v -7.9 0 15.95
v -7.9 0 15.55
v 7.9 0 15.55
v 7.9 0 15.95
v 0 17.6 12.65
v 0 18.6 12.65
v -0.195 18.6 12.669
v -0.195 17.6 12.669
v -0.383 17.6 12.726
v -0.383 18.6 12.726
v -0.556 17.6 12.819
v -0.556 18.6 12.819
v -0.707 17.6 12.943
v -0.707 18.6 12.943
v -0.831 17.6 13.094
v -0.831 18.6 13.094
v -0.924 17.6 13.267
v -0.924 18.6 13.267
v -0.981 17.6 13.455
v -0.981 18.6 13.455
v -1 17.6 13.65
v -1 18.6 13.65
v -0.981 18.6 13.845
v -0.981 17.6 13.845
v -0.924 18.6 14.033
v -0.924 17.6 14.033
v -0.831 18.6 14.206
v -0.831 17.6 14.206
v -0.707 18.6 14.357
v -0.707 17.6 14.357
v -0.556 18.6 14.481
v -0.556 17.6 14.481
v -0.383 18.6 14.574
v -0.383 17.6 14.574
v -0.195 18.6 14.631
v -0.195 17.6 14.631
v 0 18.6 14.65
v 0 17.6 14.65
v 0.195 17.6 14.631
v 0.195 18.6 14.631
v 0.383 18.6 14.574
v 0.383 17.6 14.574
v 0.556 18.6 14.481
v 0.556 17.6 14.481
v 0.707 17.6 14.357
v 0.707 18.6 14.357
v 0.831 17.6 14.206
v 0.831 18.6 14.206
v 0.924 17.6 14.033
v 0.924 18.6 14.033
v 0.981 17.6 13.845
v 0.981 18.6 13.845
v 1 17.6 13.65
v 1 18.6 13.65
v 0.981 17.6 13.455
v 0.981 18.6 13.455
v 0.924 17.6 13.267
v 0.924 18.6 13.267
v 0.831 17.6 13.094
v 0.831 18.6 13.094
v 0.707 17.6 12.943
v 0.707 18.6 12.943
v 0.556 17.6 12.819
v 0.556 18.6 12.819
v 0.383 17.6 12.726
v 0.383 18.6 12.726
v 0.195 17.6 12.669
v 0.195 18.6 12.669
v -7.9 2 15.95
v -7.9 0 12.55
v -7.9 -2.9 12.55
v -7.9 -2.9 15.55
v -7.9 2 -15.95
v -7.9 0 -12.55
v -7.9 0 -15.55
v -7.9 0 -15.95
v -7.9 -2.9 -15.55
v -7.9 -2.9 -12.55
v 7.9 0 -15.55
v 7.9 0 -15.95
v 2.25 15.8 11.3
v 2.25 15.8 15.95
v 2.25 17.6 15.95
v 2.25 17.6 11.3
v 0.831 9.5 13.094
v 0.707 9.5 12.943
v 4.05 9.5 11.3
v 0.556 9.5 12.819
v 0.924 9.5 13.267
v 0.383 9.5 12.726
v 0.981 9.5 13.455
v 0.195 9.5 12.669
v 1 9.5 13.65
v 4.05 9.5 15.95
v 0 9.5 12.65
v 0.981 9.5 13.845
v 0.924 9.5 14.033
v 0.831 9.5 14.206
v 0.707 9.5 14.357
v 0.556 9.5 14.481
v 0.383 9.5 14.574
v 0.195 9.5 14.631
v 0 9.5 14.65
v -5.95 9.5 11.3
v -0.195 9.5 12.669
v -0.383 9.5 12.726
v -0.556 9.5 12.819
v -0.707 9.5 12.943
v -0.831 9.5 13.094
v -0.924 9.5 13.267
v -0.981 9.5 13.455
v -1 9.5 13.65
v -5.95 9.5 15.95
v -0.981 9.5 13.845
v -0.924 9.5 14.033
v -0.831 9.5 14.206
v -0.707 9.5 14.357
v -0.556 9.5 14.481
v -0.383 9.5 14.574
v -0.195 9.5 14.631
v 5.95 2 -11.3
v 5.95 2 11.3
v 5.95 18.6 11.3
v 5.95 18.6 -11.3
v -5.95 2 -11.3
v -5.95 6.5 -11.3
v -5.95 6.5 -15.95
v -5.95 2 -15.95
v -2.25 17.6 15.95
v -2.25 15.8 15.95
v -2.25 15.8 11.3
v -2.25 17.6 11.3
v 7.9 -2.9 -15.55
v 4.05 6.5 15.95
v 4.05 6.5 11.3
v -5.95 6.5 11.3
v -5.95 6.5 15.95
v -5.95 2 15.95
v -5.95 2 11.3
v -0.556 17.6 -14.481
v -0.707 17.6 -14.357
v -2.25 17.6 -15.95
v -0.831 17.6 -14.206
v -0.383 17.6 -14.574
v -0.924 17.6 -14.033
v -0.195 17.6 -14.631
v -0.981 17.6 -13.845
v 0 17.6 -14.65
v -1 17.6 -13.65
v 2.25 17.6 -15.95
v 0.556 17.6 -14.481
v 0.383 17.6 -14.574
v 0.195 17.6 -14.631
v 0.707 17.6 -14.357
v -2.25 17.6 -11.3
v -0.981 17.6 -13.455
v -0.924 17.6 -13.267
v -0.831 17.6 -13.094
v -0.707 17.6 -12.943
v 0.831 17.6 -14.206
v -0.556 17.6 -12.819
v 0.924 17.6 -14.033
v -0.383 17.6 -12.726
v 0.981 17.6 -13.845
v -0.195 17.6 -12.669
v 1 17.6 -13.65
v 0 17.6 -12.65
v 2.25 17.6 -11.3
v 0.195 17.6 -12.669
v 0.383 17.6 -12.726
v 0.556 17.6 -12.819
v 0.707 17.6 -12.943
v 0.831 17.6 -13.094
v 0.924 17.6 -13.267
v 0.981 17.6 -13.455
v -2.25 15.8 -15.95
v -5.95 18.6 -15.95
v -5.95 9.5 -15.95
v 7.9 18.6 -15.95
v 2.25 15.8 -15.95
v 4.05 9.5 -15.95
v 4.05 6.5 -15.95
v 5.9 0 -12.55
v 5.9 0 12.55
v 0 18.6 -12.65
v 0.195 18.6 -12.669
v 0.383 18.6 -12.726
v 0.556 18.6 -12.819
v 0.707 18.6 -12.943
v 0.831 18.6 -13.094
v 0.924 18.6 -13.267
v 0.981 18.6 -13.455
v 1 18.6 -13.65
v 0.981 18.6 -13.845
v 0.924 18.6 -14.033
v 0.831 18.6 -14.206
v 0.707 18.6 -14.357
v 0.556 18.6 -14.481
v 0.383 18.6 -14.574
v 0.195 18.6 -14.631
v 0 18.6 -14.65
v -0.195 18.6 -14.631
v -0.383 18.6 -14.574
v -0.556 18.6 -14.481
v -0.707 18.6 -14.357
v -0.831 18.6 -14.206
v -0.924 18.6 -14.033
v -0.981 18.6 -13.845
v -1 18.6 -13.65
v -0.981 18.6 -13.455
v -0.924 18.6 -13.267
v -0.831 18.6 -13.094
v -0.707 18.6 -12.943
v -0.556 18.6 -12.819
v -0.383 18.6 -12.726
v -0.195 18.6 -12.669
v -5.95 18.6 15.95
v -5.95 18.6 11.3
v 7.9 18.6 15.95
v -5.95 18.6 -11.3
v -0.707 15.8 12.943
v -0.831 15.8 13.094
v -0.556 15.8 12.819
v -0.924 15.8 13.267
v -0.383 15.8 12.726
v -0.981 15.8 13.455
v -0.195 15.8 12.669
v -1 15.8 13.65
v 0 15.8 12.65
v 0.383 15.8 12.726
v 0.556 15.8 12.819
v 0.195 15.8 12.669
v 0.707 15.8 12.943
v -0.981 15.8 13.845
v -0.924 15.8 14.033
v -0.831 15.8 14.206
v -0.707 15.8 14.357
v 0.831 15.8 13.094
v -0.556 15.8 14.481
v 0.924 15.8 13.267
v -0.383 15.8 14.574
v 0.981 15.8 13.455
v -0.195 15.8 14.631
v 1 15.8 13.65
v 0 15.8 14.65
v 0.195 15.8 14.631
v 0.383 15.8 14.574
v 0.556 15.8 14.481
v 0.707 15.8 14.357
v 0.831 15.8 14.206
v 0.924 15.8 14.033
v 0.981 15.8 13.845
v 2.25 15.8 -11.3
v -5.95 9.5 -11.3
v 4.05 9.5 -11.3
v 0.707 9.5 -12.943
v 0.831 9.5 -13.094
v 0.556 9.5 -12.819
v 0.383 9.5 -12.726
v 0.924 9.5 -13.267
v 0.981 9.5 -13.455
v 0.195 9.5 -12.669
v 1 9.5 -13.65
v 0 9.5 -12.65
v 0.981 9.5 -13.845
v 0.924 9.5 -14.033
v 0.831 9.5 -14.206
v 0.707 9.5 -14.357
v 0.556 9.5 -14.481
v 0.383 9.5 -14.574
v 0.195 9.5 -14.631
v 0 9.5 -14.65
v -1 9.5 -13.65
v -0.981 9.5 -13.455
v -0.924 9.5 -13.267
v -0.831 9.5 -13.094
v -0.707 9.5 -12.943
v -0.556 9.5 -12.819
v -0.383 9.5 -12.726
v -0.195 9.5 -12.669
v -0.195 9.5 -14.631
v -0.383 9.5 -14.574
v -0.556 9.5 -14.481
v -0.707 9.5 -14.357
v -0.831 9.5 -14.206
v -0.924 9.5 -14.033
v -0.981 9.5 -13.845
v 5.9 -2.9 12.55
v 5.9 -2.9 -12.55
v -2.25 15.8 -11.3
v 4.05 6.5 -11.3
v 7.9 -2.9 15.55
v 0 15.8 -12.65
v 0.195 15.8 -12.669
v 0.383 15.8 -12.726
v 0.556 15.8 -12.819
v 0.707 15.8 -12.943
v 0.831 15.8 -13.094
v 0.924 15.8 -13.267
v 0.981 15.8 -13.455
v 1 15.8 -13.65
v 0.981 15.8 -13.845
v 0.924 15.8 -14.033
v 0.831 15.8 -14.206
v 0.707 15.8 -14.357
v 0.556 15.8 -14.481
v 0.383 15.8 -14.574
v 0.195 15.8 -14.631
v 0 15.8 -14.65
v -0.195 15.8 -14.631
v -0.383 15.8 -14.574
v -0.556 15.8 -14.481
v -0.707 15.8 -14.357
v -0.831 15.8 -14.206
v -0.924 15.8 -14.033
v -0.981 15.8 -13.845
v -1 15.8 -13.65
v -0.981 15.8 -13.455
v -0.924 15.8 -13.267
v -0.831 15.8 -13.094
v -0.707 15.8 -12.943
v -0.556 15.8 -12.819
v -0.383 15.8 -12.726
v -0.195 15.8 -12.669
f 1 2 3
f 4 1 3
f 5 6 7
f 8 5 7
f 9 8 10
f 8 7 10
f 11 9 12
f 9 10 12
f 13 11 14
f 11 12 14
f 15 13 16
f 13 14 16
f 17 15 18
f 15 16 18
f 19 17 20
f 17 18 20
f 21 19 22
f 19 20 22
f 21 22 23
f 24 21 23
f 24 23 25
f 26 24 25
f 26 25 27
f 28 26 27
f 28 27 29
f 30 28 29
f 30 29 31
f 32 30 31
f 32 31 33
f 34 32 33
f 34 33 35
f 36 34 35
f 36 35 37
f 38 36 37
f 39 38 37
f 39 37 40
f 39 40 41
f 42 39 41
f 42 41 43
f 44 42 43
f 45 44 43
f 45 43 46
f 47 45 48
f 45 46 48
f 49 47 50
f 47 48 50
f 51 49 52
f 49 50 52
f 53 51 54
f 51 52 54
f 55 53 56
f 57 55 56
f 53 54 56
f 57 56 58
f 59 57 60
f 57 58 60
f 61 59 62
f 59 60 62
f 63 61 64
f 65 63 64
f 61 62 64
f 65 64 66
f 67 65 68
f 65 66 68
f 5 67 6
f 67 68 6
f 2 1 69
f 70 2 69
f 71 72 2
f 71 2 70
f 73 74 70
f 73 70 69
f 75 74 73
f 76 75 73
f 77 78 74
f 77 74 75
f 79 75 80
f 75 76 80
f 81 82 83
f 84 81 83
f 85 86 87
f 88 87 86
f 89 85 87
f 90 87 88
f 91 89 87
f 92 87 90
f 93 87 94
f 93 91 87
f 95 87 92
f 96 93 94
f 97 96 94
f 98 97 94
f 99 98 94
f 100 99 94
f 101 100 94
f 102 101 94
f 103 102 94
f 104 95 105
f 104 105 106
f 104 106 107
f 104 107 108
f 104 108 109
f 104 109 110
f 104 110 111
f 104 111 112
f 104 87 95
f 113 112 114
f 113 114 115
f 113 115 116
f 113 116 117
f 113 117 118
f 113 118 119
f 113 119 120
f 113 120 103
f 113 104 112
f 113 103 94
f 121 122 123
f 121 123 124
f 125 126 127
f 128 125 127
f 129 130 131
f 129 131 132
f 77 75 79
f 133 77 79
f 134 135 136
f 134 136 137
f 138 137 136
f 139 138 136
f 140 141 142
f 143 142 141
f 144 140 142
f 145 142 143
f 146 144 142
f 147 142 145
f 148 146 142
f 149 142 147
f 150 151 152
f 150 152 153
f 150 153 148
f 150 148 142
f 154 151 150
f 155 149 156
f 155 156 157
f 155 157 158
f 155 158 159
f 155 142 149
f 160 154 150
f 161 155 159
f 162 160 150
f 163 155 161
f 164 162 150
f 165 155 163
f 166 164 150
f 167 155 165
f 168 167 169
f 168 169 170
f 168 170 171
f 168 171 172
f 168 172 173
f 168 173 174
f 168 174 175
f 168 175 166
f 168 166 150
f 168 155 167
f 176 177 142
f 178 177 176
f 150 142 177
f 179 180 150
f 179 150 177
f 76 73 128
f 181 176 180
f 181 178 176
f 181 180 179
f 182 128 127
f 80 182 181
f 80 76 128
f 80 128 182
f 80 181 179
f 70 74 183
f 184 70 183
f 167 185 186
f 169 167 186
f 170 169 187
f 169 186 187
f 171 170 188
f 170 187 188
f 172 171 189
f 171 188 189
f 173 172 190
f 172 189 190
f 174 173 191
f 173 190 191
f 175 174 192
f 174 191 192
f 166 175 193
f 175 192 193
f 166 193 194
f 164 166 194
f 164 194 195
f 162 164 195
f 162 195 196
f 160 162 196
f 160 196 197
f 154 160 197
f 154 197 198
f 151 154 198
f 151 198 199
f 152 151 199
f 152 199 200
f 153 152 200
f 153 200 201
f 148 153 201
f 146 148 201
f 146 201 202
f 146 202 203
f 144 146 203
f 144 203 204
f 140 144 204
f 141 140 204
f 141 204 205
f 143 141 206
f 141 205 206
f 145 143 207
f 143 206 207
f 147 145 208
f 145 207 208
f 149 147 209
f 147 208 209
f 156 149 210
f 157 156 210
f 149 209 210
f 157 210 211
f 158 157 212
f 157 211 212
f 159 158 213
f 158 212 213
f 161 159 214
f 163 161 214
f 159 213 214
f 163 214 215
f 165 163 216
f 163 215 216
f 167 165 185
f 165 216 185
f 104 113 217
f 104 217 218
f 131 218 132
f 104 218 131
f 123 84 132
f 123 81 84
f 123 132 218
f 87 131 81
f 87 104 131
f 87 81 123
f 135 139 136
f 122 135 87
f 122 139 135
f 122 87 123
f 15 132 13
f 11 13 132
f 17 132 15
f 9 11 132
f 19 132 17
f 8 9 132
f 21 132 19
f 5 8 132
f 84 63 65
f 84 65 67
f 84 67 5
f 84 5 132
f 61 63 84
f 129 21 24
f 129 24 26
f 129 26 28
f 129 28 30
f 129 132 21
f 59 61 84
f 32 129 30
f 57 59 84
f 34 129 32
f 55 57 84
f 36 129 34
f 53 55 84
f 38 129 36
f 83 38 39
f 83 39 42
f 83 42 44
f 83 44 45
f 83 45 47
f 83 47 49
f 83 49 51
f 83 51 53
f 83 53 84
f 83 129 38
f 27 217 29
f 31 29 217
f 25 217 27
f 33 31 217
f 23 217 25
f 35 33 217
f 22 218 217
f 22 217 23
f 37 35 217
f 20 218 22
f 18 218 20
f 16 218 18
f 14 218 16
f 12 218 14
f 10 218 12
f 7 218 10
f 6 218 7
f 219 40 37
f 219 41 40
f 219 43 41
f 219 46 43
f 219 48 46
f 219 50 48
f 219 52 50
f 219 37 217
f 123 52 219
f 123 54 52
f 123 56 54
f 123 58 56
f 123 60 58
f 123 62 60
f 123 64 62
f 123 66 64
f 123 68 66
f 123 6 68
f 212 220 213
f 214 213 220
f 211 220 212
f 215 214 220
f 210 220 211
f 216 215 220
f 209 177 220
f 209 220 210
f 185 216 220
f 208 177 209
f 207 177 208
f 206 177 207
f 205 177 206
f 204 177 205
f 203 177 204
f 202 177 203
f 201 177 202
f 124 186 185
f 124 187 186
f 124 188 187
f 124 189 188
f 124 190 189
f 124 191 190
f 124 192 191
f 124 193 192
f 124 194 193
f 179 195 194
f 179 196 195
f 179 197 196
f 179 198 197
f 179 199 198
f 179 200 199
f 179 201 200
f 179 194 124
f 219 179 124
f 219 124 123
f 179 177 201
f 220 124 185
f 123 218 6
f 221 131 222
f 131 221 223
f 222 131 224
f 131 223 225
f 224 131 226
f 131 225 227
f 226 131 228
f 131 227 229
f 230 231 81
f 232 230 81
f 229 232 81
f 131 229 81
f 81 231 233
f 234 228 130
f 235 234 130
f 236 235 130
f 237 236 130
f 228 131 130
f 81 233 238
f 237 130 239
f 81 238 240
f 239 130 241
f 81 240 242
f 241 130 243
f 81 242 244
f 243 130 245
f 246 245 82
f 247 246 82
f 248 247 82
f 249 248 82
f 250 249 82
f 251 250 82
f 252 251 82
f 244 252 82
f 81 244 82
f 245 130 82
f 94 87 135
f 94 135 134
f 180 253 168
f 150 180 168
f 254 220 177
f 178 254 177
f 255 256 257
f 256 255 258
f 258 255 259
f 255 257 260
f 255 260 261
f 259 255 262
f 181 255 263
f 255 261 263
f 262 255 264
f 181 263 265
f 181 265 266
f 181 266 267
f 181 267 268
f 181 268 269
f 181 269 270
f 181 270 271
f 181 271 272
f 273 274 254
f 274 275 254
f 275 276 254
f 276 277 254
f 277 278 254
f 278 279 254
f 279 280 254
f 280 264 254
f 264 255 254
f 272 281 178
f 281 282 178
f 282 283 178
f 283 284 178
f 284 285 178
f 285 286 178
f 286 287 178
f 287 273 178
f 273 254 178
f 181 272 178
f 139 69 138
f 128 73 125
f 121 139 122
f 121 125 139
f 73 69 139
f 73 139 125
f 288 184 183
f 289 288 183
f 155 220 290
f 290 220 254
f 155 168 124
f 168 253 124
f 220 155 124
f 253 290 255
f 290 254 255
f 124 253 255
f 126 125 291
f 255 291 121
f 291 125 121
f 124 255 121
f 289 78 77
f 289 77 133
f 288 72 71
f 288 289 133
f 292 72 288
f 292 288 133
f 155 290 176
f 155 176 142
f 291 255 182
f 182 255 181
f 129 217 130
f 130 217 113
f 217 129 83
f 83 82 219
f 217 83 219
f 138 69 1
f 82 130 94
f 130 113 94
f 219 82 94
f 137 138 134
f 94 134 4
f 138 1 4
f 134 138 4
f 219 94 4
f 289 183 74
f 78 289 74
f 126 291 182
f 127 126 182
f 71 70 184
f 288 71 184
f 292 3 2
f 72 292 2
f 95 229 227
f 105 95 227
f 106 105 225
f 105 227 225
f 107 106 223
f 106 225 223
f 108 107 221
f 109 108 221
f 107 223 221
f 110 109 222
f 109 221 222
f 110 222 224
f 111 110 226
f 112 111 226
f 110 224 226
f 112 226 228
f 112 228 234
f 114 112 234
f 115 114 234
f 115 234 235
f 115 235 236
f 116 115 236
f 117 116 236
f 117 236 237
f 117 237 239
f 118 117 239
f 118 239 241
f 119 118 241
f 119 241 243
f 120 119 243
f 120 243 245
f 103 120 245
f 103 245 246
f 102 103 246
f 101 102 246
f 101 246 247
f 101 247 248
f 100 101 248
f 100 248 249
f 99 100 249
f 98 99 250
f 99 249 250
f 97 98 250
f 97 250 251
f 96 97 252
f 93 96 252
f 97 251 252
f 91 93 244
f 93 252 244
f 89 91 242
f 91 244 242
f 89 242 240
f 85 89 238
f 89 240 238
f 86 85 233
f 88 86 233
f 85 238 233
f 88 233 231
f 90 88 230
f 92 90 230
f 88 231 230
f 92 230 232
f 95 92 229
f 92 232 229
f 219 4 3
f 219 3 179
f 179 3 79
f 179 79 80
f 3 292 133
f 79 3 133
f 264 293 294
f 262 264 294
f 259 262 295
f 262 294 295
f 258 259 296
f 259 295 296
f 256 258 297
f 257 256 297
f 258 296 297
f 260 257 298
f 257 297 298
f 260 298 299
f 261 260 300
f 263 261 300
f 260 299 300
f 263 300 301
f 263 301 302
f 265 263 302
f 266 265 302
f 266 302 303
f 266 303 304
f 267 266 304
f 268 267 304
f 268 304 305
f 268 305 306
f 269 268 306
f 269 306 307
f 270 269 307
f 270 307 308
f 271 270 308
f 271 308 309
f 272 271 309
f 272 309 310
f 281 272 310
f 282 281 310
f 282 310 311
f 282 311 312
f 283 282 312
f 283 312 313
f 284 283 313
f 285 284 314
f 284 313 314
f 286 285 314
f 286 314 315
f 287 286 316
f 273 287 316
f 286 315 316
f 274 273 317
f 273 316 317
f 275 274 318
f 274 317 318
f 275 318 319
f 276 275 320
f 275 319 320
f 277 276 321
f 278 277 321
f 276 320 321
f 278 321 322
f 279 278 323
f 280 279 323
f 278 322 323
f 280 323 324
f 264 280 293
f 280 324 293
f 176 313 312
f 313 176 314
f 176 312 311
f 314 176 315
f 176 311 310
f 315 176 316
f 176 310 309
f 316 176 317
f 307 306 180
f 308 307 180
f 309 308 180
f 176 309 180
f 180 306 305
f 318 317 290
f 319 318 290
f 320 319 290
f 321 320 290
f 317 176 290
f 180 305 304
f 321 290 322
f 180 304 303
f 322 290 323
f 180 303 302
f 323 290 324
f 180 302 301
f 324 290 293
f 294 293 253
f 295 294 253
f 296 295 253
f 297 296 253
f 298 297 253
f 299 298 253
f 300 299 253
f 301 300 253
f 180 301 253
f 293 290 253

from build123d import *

# Parameters (mm, degrees)
SKETCH1_W           = 15.8
SKETCH1_H           = 31.9
BOSS_EXTRUDE1_DEPTH = 2
SKETCH2_W           = 15.8
SKETCH2_H           = 31.9
SKETCH2_W_2         = 11.9
SKETCH2_H_2         = 22.6
BOSS_EXTRUDE3_DEPTH = 16.6
SKETCH3_R           = 1
CUT_EXTRUDE1_DEPTH  = 10
SKETCH4_W           = 4.5
SKETCH4_H           = 1.8
CUT_EXTRUDE2_DEPTH  = 38.762150362
SKETCH5_W           = 1.95
SKETCH5_H           = 31.9
CUT_EXTRUDE3_DEPTH  = 16.6
SKETCH6_W           = 4.65
SKETCH6_H           = 3
CUT_EXTRUDE4_DEPTH  = 10
BOSS_EXTRUDE4_DEPTH = 2.9


with BuildPart() as part:
    # Sketch1 → Boss-Extrude1 (new body)
    with BuildSketch(Plane(origin=(0, 0, 0), x_dir=(1, 0, 0), z_dir=(0, 1, 0))):
        Rectangle(SKETCH1_W, SKETCH1_H)
    extrude(amount=BOSS_EXTRUDE1_DEPTH)

    # Sketch2 → Boss-Extrude3 (add)
    with BuildSketch(Plane(origin=(0, 2, 0), x_dir=(1, 0, 0), z_dir=(0, 1, 0))):
        Rectangle(SKETCH2_W, SKETCH2_H)
        Rectangle(SKETCH2_W_2, SKETCH2_H_2, mode=Mode.SUBTRACT)
    extrude(amount=BOSS_EXTRUDE3_DEPTH)

    # Sketch3 → Cut-Extrude1 (cut)
    with BuildSketch(Plane(origin=(0, 18.6, 0), x_dir=(1, 0, 0), z_dir=(0, 1, 0))):
        with Locations(Location((0, 13.65, 0), (0, 0, 270))):
            Circle(SKETCH3_R)
        with Locations(Location((0, -13.65, 0), (0, 0, 90))):
            Circle(SKETCH3_R)
    extrude(amount=-CUT_EXTRUDE1_DEPTH, mode=Mode.SUBTRACT)

    # Sketch4 → Cut-Extrude2 (cut, through all)
    with BuildSketch(Plane.XY.offset(15.95)):
        with Locations((0, 16.7)):
            Rectangle(SKETCH4_W, SKETCH4_H)
    extrude(amount=-CUT_EXTRUDE2_DEPTH, mode=Mode.SUBTRACT)

    # Sketch5 → Cut-Extrude3 (cut)
    with BuildSketch(Plane(origin=(0, 18.6, 0), x_dir=(1, 0, 0), z_dir=(0, 1, 0))):
        with Locations((-6.925, 0)):
            Rectangle(SKETCH5_W, SKETCH5_H)
    extrude(amount=-CUT_EXTRUDE3_DEPTH, mode=Mode.SUBTRACT)

    # Sketch6 → Cut-Extrude4 (cut)
    with BuildSketch(Plane.ZY.offset(5.95)):
        with Locations((13.625, 8)):
            Rectangle(SKETCH6_W, SKETCH6_H)
    cut_extrude4 = extrude(amount=-CUT_EXTRUDE4_DEPTH, mode=Mode.SUBTRACT)

    # Sketch7 → Boss-Extrude4 (add)
    with BuildSketch(Plane.XZ):
        Polygon((7.9, 15.55), (-7.9, 15.55), (-7.9, 12.55), (5.9, 12.55), (5.9, -12.55), (-7.9, -12.55), (-7.9, -15.55), (7.9, -15.55), align=None)
    extrude(amount=BOSS_EXTRUDE4_DEPTH)

    # Mirror1: Cut-Extrude4 across plane
    add(cut_extrude4.mirror(Plane.XY), mode=Mode.SUBTRACT)


solid = part.part
